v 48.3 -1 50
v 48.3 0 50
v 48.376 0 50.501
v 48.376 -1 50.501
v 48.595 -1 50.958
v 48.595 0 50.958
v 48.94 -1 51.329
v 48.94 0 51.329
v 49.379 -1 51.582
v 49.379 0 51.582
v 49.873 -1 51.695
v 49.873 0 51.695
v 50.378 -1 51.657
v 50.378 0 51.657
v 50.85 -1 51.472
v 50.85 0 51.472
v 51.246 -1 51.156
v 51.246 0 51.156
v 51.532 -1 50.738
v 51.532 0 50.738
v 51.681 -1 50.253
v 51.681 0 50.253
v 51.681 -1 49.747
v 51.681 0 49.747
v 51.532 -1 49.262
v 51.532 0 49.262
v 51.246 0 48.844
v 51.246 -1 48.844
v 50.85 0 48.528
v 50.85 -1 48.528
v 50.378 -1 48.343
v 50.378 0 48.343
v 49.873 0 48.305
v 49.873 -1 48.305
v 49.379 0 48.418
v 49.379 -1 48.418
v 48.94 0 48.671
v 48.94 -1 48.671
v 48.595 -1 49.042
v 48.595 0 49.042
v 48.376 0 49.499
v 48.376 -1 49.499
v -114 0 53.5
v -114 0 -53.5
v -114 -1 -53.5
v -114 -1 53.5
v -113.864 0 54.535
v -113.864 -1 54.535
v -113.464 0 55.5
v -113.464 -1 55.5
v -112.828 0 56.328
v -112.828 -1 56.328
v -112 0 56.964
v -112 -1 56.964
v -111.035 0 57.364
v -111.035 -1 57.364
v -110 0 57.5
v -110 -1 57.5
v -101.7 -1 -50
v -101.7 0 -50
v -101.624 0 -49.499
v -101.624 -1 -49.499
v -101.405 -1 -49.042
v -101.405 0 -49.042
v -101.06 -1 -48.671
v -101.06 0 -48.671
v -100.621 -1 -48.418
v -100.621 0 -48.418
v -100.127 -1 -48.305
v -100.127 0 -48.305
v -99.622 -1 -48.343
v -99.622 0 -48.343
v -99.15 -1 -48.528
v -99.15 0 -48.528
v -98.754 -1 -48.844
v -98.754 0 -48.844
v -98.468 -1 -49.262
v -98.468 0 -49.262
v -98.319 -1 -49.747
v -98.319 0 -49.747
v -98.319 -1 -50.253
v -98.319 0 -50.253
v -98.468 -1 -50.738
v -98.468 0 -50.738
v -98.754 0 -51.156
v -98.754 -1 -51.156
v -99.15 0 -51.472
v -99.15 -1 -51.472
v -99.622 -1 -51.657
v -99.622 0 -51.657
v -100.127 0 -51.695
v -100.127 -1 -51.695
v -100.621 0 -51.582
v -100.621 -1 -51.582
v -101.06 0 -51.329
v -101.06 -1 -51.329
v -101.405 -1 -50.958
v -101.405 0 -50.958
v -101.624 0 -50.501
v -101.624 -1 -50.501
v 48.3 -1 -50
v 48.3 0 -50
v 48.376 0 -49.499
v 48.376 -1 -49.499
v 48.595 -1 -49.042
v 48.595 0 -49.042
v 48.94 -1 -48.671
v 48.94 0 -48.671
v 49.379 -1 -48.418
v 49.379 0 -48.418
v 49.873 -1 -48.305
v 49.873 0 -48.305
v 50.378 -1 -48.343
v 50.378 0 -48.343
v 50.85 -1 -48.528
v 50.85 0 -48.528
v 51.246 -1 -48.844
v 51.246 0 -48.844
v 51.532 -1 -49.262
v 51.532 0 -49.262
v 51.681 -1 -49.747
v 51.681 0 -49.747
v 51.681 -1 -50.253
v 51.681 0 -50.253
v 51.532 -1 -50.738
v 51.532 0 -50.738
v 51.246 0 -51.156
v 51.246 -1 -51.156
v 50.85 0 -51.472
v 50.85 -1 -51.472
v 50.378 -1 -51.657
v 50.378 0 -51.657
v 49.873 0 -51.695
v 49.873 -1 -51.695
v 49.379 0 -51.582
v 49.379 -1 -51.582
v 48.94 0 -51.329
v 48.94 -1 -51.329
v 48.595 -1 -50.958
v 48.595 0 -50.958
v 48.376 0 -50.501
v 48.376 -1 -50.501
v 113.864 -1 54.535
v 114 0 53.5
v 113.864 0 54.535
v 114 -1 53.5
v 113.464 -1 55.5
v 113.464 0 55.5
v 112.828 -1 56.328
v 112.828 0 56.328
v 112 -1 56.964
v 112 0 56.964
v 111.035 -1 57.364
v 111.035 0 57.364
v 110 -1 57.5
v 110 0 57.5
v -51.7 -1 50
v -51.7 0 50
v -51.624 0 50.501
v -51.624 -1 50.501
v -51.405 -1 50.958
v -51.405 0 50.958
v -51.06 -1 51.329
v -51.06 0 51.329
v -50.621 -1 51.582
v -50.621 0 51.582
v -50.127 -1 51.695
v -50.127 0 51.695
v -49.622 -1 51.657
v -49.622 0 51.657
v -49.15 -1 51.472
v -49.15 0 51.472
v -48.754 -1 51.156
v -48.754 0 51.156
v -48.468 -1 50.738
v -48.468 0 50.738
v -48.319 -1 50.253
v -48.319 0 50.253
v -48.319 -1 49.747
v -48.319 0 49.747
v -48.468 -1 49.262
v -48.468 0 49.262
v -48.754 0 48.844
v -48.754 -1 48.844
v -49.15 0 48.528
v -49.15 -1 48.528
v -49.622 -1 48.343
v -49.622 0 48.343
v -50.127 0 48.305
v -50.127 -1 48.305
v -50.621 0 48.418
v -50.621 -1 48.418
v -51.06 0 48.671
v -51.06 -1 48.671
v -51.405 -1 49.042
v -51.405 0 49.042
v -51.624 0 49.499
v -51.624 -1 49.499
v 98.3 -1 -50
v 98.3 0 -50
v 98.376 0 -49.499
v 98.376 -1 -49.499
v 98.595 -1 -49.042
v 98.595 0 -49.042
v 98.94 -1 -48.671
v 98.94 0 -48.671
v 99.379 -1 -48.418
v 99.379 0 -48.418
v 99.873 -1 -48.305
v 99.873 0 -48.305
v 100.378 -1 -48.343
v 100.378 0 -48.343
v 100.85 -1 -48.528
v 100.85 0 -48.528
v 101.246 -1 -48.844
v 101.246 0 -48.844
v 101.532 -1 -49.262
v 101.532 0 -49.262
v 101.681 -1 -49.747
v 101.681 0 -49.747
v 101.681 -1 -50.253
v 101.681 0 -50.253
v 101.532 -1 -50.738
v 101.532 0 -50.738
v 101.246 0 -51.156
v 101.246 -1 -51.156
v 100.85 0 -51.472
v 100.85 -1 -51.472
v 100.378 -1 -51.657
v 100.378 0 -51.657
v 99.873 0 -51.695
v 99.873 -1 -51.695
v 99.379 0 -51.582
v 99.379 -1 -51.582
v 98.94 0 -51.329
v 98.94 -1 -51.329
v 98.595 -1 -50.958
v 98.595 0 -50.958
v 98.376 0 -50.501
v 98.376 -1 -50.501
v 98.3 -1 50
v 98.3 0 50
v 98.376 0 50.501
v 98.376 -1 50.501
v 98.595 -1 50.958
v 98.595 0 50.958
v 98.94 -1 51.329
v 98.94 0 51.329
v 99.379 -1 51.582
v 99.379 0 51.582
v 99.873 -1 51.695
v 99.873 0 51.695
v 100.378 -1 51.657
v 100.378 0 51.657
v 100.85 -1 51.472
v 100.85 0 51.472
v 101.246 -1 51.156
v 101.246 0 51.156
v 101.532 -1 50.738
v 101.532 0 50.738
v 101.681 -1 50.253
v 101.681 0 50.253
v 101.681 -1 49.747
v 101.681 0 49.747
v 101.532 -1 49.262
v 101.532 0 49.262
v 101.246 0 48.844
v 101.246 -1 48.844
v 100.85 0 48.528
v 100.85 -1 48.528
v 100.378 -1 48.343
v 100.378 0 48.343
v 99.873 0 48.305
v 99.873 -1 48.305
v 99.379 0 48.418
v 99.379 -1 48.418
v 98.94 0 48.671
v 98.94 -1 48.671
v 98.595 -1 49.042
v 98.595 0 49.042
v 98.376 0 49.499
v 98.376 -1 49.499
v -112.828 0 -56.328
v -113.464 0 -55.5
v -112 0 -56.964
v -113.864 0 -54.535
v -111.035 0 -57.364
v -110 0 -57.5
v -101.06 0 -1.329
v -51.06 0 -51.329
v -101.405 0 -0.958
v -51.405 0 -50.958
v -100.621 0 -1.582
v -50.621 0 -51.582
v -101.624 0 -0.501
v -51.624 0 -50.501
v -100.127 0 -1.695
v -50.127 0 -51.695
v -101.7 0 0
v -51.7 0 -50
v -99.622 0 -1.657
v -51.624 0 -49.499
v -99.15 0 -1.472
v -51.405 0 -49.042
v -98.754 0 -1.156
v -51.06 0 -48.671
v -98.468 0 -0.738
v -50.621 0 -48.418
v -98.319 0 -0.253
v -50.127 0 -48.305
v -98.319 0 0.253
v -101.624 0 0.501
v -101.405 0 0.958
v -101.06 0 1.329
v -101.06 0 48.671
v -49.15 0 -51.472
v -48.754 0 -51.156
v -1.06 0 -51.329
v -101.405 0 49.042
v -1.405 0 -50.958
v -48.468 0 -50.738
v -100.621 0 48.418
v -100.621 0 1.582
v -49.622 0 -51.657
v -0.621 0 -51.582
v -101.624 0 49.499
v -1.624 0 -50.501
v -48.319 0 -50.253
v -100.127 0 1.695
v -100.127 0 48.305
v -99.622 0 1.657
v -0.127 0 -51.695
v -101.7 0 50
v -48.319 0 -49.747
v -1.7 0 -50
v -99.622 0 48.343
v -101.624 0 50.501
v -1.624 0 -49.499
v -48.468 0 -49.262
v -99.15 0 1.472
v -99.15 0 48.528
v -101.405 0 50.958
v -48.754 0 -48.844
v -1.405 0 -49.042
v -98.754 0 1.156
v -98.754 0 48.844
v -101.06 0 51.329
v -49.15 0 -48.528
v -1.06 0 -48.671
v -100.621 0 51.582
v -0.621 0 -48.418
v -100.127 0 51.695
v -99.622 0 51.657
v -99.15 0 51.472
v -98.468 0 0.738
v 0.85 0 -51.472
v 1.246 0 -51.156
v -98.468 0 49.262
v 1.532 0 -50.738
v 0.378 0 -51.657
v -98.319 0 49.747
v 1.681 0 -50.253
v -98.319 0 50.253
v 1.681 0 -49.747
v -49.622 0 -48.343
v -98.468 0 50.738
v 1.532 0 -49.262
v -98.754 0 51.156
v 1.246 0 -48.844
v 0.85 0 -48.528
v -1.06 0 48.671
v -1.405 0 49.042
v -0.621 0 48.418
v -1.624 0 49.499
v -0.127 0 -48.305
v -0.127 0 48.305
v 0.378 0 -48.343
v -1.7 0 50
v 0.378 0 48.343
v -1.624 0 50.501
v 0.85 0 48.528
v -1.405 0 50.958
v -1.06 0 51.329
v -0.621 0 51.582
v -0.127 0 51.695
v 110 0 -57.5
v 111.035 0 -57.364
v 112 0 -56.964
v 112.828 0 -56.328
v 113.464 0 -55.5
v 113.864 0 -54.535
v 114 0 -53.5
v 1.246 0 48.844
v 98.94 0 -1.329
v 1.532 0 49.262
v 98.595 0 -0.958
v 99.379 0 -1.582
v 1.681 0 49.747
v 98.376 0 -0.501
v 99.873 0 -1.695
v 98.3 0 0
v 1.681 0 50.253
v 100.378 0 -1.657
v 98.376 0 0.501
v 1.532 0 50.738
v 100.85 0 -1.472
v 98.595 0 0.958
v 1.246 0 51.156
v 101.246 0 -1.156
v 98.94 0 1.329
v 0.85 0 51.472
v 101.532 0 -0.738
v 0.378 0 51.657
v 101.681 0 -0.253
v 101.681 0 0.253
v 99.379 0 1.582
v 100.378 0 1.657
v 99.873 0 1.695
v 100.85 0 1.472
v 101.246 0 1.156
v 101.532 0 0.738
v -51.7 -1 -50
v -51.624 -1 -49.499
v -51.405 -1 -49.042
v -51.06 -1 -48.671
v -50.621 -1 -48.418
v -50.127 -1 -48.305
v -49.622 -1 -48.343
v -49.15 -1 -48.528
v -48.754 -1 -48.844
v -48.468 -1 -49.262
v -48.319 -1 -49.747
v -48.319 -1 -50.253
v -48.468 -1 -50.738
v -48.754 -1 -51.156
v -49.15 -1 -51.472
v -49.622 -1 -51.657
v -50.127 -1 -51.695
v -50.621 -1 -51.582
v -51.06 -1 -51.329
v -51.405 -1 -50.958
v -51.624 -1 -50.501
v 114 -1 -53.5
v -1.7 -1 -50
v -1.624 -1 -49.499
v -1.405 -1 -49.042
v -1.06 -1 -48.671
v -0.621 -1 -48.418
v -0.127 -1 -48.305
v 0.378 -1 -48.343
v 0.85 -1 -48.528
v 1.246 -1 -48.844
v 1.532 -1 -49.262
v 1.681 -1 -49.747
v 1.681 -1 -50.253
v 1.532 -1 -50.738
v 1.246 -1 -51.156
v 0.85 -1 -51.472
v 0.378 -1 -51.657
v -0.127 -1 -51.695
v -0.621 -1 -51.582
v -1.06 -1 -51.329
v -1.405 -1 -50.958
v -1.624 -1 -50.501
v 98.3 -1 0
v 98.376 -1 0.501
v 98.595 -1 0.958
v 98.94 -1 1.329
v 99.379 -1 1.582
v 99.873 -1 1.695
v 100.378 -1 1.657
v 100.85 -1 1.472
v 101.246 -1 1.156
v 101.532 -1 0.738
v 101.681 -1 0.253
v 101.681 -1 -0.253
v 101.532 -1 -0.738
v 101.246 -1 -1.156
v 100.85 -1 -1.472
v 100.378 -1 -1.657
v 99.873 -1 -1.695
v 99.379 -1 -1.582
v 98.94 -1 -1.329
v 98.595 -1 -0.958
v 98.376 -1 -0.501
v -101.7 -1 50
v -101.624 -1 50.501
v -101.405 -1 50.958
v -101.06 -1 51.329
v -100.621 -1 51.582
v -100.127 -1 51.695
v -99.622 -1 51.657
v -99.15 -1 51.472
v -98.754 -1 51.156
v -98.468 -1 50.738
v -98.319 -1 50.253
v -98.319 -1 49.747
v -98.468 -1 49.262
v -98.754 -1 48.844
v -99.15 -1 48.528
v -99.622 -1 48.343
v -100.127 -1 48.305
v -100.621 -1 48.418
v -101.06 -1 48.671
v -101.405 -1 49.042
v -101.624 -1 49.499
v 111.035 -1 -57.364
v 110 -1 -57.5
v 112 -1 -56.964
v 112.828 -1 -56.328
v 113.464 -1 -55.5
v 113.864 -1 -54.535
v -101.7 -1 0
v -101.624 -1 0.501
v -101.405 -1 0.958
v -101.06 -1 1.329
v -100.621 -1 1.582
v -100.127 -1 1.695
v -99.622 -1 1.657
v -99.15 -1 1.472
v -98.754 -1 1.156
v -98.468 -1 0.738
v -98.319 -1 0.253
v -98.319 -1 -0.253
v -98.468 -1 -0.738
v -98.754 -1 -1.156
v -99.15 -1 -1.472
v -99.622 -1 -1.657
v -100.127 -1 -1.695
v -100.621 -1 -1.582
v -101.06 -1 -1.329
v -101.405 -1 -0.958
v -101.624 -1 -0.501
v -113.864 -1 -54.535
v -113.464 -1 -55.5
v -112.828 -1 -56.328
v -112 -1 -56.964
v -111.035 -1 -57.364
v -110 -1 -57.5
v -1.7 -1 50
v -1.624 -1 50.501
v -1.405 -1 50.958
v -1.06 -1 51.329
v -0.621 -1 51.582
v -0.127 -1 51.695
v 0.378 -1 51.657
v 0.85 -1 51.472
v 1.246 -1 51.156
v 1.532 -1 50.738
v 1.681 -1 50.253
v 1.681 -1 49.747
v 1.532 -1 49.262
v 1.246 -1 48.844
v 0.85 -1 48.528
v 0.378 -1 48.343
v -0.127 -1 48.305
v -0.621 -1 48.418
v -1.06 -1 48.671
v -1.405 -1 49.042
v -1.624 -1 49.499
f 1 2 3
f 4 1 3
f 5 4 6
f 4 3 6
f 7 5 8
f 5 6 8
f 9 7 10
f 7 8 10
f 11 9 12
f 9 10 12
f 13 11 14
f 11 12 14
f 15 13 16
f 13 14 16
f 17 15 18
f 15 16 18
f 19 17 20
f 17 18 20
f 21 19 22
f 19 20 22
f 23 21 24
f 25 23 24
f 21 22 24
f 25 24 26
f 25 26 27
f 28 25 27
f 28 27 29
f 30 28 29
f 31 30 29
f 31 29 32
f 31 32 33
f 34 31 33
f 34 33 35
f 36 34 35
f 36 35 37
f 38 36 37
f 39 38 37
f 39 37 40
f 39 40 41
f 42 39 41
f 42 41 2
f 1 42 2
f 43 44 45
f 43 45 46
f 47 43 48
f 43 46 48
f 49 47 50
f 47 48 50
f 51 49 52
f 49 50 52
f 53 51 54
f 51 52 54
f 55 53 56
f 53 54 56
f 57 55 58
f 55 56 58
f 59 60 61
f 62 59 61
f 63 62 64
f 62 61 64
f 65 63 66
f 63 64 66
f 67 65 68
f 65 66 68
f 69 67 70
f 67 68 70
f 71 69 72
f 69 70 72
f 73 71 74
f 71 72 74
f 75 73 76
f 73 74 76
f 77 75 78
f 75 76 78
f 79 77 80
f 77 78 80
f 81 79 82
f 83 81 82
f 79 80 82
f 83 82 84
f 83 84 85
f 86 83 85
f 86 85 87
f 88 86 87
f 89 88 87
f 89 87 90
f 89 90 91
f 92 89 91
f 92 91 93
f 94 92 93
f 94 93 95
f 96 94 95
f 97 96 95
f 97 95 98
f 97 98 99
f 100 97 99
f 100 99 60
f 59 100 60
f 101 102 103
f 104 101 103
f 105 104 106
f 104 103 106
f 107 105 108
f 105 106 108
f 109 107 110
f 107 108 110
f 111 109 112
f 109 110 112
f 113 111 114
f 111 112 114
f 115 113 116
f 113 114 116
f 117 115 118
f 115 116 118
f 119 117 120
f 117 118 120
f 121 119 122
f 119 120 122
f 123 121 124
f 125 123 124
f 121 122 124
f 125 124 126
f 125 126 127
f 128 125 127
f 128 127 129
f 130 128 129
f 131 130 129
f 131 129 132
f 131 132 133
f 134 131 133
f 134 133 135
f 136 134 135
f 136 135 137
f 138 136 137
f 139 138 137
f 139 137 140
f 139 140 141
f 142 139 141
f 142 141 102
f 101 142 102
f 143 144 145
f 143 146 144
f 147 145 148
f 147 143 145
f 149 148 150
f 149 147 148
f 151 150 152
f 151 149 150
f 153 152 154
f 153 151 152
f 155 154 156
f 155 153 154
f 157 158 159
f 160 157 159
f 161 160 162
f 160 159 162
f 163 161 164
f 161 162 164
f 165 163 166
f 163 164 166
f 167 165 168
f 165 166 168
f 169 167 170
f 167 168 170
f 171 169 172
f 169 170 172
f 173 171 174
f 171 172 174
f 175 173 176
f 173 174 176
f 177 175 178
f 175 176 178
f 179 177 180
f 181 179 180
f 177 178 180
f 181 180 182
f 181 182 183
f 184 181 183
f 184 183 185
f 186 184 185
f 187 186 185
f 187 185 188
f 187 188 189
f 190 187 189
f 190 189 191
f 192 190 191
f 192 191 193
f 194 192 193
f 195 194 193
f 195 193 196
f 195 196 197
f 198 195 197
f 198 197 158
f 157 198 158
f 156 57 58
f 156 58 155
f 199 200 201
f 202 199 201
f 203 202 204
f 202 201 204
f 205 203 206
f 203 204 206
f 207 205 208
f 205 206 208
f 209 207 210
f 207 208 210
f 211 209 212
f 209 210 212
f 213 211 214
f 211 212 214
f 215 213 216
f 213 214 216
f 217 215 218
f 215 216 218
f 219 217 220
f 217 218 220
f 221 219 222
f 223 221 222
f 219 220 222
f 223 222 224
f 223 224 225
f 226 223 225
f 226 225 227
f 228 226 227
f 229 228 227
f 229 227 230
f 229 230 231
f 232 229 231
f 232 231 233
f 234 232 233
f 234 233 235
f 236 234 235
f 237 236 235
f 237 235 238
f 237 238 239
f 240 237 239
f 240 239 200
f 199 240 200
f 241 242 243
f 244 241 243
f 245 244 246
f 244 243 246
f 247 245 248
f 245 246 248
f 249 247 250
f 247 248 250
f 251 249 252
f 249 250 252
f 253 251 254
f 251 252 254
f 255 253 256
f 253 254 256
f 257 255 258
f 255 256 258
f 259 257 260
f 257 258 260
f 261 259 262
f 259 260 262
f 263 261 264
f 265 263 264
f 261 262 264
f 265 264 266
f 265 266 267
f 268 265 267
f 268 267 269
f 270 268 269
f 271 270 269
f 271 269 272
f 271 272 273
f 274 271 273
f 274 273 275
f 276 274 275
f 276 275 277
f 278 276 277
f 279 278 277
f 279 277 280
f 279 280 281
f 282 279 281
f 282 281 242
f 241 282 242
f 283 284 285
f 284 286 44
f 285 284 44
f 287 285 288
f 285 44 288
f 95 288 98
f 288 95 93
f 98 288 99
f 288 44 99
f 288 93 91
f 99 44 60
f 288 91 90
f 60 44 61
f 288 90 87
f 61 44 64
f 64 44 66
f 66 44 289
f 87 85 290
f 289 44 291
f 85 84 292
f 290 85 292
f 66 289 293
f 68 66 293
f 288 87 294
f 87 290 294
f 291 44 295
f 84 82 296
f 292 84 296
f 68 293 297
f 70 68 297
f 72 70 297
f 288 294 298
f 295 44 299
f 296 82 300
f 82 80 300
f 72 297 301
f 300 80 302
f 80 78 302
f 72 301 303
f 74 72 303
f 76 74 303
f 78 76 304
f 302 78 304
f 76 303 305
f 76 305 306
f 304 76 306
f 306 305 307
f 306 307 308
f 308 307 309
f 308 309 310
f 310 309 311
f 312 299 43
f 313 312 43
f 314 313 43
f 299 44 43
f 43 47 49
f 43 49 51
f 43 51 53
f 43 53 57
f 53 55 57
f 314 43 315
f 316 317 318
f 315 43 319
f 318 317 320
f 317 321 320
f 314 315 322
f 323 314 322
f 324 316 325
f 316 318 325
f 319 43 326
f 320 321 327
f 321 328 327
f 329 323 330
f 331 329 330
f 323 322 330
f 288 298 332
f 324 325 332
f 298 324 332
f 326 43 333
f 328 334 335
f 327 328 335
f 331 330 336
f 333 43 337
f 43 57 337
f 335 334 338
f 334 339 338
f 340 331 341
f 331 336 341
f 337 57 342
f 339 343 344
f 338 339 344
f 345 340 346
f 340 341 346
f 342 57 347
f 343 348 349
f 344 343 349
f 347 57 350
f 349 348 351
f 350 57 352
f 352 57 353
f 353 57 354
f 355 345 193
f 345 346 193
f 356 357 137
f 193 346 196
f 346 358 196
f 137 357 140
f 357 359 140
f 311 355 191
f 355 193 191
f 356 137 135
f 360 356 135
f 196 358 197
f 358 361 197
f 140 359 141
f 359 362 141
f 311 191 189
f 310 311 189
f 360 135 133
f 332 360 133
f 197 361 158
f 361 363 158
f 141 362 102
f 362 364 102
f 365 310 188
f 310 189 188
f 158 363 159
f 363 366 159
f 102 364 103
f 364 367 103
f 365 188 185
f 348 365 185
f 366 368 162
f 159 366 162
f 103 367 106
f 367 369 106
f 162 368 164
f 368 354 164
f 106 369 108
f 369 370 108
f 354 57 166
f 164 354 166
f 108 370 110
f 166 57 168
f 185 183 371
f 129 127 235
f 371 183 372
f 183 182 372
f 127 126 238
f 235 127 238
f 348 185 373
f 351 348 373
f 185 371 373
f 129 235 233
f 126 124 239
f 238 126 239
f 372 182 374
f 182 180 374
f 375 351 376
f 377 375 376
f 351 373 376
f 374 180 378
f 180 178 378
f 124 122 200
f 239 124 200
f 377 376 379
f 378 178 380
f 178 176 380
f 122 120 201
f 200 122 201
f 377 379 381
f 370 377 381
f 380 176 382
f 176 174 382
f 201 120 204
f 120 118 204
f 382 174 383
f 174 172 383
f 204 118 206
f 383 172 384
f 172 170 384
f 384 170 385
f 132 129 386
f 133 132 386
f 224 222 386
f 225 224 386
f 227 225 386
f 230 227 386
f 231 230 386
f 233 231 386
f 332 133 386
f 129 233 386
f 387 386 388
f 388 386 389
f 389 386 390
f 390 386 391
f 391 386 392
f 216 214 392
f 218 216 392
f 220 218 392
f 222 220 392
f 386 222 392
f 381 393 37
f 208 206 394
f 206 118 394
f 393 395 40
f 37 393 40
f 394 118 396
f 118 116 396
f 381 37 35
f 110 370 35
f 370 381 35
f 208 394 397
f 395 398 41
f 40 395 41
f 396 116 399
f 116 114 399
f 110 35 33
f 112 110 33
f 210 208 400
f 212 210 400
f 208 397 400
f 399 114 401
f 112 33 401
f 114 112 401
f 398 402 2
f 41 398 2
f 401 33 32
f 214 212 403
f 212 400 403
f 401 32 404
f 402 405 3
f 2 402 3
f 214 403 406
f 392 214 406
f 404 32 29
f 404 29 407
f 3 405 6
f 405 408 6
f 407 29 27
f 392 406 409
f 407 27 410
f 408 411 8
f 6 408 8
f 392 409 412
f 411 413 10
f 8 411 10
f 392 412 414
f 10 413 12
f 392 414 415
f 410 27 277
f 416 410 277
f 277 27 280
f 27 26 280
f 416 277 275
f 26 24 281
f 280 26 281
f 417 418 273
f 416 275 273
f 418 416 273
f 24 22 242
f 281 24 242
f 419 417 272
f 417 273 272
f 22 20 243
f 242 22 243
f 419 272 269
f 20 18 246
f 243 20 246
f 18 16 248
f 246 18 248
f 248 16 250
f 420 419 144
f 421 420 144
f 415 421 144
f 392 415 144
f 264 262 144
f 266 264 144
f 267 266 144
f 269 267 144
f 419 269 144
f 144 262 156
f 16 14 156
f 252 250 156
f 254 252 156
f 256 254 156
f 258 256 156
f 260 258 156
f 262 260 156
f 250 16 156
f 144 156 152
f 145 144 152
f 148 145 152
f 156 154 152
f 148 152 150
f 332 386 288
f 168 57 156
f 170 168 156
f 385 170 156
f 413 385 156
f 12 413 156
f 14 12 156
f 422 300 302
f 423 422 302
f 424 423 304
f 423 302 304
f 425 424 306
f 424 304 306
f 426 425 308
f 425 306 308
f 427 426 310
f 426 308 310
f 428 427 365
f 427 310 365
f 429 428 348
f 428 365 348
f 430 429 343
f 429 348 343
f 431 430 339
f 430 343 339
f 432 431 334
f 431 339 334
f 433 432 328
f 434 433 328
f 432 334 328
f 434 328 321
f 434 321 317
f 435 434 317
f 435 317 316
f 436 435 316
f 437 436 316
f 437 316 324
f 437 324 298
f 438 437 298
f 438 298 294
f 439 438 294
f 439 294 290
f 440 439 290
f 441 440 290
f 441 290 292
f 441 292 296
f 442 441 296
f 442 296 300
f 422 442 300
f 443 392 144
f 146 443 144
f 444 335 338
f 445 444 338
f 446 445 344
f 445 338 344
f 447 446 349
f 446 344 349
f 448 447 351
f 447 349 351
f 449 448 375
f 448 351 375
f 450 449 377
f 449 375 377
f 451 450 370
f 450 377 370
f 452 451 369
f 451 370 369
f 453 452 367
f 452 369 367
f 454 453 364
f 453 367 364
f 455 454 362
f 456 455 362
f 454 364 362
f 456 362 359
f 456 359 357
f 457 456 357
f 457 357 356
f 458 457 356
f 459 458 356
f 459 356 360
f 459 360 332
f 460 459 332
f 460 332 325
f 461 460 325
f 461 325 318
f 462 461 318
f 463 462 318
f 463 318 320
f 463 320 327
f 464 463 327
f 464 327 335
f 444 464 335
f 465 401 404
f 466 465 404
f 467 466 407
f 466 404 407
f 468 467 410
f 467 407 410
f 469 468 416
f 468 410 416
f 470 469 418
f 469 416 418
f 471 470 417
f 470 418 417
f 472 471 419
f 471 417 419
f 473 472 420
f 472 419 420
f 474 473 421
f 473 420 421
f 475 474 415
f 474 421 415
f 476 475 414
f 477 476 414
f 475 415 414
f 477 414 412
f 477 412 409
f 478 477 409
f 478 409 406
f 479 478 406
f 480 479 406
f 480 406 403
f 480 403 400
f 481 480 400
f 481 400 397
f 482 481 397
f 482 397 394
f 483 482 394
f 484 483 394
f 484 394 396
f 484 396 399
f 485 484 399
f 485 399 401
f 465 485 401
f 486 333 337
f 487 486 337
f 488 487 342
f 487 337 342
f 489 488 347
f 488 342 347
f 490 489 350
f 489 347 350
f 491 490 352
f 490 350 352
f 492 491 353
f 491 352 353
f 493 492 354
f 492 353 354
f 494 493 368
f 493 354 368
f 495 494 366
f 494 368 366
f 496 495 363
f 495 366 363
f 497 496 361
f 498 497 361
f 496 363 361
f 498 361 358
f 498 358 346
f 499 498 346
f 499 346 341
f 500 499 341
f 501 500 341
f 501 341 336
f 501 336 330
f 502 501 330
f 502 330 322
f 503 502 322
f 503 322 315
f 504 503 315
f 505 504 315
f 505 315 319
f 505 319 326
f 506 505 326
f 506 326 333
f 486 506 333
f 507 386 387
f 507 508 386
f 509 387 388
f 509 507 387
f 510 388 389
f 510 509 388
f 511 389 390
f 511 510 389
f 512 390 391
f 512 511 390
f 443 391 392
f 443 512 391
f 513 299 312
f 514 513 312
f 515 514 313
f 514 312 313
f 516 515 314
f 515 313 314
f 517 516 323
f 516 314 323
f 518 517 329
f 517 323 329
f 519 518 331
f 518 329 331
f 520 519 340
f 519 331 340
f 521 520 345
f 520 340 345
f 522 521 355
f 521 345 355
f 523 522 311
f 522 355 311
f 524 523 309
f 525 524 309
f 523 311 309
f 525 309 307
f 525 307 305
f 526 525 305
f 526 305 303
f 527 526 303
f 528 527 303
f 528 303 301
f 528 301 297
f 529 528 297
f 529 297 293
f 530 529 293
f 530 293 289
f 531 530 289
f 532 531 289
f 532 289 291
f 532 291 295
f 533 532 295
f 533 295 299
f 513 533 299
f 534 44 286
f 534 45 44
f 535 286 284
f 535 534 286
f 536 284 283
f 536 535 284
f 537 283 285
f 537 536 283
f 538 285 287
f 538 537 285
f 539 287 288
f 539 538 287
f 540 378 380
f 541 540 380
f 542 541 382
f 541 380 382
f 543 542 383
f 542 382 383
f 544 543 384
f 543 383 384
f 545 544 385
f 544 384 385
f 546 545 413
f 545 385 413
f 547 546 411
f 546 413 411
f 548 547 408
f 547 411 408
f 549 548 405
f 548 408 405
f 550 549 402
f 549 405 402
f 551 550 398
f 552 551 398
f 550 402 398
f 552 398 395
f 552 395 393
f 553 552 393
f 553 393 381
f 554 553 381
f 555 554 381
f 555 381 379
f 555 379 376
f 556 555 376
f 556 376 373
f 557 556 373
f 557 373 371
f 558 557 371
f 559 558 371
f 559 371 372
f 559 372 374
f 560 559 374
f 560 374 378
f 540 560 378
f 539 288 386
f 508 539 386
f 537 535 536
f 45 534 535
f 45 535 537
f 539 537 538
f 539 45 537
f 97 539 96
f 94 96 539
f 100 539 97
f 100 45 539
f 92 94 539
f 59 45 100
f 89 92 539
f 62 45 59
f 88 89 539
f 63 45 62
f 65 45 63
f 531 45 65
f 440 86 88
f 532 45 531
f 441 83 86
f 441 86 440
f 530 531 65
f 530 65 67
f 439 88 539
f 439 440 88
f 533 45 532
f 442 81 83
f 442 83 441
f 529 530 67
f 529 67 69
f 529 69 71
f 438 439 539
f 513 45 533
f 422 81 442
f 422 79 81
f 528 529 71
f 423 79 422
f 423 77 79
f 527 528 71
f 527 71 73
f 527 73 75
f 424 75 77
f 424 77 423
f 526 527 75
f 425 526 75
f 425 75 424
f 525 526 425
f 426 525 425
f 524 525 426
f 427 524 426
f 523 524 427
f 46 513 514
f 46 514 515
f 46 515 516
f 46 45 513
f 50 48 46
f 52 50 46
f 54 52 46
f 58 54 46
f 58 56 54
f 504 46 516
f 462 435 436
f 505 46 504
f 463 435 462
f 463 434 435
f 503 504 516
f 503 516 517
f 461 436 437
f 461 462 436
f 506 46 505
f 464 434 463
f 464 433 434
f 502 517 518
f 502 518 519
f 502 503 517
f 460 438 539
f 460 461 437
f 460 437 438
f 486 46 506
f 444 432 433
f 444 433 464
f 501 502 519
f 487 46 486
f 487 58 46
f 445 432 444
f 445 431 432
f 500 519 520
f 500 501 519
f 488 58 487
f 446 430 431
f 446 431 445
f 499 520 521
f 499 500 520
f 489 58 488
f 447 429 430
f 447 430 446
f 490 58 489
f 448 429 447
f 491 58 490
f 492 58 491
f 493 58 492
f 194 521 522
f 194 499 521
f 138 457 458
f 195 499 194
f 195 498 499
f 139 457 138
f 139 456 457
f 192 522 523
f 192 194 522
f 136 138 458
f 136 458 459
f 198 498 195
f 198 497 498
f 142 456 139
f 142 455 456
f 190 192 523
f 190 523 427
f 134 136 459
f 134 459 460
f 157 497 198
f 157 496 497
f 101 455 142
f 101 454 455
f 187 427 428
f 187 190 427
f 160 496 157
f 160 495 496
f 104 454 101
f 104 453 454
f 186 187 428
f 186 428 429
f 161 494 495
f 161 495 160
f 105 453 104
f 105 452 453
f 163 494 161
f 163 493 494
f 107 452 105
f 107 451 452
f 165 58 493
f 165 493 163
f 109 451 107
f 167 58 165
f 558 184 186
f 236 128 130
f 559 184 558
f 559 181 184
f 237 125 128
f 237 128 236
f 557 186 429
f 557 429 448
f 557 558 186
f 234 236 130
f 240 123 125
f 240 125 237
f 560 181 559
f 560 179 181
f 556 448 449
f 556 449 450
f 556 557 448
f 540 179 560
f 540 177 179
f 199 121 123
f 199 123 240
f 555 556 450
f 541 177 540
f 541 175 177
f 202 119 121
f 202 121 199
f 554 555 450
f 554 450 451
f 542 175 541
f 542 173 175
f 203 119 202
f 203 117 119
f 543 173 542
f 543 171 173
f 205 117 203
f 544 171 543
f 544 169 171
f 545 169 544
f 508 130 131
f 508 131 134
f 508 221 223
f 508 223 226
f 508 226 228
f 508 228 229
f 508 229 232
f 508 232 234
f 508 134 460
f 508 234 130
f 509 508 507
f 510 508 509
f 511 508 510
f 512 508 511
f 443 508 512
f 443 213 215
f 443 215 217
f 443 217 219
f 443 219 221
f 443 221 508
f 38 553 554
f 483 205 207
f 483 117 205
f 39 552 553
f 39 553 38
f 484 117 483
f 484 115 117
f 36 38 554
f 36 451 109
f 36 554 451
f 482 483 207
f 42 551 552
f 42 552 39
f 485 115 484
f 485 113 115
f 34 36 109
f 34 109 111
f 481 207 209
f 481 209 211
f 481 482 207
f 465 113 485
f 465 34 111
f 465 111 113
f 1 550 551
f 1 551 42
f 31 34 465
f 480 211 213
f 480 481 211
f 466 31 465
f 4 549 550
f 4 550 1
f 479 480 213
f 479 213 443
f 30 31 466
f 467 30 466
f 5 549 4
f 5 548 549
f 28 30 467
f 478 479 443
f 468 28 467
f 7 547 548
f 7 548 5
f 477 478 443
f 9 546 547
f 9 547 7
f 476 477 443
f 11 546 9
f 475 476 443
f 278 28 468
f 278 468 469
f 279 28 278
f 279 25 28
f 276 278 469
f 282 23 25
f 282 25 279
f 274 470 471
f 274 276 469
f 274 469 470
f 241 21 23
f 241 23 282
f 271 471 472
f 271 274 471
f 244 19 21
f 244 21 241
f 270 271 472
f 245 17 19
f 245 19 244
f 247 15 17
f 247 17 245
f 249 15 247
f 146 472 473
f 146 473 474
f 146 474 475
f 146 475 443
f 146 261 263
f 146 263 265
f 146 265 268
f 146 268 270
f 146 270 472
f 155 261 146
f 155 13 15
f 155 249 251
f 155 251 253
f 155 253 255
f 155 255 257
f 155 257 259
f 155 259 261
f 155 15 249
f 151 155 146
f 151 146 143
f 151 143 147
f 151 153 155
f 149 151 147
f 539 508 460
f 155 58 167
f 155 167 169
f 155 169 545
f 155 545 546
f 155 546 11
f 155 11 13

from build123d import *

# Parameters (mm, degrees)
F0_W     = 228
F0_H     = 115
F1_DEPTH = 1
F2_R     = 4
F4_D     = 3.4


with BuildPart() as f1:
    # F0 (on Front) → F1 (new body)
    with BuildSketch(Plane.XZ):
        Rectangle(F0_W, F0_H)
    extrude(amount=F1_DEPTH)

    # F2
    f2_edges = [f1.edges().sort_by_distance(p)[0] for p in [
        (114, -0.5, 57.5),
        (-114, -0.5, 57.5),
        (-114, -0.5, -57.5),
        (114, -0.5, -57.5),
    ]]
    fillet(f2_edges, radius=F2_R)

    # F4 (through all)
    with Locations(Plane.XZ.offset(1)):
        with Locations((-50, 50), (-100, 0), (-100, -50), (-50, -50), (-100, 50), (0, 50), (100, -50), (0, -50), (50, -50), (100, 50), (100, 0), (50, 50)):
            Hole(F4_D / 2)


solid = f1.part
